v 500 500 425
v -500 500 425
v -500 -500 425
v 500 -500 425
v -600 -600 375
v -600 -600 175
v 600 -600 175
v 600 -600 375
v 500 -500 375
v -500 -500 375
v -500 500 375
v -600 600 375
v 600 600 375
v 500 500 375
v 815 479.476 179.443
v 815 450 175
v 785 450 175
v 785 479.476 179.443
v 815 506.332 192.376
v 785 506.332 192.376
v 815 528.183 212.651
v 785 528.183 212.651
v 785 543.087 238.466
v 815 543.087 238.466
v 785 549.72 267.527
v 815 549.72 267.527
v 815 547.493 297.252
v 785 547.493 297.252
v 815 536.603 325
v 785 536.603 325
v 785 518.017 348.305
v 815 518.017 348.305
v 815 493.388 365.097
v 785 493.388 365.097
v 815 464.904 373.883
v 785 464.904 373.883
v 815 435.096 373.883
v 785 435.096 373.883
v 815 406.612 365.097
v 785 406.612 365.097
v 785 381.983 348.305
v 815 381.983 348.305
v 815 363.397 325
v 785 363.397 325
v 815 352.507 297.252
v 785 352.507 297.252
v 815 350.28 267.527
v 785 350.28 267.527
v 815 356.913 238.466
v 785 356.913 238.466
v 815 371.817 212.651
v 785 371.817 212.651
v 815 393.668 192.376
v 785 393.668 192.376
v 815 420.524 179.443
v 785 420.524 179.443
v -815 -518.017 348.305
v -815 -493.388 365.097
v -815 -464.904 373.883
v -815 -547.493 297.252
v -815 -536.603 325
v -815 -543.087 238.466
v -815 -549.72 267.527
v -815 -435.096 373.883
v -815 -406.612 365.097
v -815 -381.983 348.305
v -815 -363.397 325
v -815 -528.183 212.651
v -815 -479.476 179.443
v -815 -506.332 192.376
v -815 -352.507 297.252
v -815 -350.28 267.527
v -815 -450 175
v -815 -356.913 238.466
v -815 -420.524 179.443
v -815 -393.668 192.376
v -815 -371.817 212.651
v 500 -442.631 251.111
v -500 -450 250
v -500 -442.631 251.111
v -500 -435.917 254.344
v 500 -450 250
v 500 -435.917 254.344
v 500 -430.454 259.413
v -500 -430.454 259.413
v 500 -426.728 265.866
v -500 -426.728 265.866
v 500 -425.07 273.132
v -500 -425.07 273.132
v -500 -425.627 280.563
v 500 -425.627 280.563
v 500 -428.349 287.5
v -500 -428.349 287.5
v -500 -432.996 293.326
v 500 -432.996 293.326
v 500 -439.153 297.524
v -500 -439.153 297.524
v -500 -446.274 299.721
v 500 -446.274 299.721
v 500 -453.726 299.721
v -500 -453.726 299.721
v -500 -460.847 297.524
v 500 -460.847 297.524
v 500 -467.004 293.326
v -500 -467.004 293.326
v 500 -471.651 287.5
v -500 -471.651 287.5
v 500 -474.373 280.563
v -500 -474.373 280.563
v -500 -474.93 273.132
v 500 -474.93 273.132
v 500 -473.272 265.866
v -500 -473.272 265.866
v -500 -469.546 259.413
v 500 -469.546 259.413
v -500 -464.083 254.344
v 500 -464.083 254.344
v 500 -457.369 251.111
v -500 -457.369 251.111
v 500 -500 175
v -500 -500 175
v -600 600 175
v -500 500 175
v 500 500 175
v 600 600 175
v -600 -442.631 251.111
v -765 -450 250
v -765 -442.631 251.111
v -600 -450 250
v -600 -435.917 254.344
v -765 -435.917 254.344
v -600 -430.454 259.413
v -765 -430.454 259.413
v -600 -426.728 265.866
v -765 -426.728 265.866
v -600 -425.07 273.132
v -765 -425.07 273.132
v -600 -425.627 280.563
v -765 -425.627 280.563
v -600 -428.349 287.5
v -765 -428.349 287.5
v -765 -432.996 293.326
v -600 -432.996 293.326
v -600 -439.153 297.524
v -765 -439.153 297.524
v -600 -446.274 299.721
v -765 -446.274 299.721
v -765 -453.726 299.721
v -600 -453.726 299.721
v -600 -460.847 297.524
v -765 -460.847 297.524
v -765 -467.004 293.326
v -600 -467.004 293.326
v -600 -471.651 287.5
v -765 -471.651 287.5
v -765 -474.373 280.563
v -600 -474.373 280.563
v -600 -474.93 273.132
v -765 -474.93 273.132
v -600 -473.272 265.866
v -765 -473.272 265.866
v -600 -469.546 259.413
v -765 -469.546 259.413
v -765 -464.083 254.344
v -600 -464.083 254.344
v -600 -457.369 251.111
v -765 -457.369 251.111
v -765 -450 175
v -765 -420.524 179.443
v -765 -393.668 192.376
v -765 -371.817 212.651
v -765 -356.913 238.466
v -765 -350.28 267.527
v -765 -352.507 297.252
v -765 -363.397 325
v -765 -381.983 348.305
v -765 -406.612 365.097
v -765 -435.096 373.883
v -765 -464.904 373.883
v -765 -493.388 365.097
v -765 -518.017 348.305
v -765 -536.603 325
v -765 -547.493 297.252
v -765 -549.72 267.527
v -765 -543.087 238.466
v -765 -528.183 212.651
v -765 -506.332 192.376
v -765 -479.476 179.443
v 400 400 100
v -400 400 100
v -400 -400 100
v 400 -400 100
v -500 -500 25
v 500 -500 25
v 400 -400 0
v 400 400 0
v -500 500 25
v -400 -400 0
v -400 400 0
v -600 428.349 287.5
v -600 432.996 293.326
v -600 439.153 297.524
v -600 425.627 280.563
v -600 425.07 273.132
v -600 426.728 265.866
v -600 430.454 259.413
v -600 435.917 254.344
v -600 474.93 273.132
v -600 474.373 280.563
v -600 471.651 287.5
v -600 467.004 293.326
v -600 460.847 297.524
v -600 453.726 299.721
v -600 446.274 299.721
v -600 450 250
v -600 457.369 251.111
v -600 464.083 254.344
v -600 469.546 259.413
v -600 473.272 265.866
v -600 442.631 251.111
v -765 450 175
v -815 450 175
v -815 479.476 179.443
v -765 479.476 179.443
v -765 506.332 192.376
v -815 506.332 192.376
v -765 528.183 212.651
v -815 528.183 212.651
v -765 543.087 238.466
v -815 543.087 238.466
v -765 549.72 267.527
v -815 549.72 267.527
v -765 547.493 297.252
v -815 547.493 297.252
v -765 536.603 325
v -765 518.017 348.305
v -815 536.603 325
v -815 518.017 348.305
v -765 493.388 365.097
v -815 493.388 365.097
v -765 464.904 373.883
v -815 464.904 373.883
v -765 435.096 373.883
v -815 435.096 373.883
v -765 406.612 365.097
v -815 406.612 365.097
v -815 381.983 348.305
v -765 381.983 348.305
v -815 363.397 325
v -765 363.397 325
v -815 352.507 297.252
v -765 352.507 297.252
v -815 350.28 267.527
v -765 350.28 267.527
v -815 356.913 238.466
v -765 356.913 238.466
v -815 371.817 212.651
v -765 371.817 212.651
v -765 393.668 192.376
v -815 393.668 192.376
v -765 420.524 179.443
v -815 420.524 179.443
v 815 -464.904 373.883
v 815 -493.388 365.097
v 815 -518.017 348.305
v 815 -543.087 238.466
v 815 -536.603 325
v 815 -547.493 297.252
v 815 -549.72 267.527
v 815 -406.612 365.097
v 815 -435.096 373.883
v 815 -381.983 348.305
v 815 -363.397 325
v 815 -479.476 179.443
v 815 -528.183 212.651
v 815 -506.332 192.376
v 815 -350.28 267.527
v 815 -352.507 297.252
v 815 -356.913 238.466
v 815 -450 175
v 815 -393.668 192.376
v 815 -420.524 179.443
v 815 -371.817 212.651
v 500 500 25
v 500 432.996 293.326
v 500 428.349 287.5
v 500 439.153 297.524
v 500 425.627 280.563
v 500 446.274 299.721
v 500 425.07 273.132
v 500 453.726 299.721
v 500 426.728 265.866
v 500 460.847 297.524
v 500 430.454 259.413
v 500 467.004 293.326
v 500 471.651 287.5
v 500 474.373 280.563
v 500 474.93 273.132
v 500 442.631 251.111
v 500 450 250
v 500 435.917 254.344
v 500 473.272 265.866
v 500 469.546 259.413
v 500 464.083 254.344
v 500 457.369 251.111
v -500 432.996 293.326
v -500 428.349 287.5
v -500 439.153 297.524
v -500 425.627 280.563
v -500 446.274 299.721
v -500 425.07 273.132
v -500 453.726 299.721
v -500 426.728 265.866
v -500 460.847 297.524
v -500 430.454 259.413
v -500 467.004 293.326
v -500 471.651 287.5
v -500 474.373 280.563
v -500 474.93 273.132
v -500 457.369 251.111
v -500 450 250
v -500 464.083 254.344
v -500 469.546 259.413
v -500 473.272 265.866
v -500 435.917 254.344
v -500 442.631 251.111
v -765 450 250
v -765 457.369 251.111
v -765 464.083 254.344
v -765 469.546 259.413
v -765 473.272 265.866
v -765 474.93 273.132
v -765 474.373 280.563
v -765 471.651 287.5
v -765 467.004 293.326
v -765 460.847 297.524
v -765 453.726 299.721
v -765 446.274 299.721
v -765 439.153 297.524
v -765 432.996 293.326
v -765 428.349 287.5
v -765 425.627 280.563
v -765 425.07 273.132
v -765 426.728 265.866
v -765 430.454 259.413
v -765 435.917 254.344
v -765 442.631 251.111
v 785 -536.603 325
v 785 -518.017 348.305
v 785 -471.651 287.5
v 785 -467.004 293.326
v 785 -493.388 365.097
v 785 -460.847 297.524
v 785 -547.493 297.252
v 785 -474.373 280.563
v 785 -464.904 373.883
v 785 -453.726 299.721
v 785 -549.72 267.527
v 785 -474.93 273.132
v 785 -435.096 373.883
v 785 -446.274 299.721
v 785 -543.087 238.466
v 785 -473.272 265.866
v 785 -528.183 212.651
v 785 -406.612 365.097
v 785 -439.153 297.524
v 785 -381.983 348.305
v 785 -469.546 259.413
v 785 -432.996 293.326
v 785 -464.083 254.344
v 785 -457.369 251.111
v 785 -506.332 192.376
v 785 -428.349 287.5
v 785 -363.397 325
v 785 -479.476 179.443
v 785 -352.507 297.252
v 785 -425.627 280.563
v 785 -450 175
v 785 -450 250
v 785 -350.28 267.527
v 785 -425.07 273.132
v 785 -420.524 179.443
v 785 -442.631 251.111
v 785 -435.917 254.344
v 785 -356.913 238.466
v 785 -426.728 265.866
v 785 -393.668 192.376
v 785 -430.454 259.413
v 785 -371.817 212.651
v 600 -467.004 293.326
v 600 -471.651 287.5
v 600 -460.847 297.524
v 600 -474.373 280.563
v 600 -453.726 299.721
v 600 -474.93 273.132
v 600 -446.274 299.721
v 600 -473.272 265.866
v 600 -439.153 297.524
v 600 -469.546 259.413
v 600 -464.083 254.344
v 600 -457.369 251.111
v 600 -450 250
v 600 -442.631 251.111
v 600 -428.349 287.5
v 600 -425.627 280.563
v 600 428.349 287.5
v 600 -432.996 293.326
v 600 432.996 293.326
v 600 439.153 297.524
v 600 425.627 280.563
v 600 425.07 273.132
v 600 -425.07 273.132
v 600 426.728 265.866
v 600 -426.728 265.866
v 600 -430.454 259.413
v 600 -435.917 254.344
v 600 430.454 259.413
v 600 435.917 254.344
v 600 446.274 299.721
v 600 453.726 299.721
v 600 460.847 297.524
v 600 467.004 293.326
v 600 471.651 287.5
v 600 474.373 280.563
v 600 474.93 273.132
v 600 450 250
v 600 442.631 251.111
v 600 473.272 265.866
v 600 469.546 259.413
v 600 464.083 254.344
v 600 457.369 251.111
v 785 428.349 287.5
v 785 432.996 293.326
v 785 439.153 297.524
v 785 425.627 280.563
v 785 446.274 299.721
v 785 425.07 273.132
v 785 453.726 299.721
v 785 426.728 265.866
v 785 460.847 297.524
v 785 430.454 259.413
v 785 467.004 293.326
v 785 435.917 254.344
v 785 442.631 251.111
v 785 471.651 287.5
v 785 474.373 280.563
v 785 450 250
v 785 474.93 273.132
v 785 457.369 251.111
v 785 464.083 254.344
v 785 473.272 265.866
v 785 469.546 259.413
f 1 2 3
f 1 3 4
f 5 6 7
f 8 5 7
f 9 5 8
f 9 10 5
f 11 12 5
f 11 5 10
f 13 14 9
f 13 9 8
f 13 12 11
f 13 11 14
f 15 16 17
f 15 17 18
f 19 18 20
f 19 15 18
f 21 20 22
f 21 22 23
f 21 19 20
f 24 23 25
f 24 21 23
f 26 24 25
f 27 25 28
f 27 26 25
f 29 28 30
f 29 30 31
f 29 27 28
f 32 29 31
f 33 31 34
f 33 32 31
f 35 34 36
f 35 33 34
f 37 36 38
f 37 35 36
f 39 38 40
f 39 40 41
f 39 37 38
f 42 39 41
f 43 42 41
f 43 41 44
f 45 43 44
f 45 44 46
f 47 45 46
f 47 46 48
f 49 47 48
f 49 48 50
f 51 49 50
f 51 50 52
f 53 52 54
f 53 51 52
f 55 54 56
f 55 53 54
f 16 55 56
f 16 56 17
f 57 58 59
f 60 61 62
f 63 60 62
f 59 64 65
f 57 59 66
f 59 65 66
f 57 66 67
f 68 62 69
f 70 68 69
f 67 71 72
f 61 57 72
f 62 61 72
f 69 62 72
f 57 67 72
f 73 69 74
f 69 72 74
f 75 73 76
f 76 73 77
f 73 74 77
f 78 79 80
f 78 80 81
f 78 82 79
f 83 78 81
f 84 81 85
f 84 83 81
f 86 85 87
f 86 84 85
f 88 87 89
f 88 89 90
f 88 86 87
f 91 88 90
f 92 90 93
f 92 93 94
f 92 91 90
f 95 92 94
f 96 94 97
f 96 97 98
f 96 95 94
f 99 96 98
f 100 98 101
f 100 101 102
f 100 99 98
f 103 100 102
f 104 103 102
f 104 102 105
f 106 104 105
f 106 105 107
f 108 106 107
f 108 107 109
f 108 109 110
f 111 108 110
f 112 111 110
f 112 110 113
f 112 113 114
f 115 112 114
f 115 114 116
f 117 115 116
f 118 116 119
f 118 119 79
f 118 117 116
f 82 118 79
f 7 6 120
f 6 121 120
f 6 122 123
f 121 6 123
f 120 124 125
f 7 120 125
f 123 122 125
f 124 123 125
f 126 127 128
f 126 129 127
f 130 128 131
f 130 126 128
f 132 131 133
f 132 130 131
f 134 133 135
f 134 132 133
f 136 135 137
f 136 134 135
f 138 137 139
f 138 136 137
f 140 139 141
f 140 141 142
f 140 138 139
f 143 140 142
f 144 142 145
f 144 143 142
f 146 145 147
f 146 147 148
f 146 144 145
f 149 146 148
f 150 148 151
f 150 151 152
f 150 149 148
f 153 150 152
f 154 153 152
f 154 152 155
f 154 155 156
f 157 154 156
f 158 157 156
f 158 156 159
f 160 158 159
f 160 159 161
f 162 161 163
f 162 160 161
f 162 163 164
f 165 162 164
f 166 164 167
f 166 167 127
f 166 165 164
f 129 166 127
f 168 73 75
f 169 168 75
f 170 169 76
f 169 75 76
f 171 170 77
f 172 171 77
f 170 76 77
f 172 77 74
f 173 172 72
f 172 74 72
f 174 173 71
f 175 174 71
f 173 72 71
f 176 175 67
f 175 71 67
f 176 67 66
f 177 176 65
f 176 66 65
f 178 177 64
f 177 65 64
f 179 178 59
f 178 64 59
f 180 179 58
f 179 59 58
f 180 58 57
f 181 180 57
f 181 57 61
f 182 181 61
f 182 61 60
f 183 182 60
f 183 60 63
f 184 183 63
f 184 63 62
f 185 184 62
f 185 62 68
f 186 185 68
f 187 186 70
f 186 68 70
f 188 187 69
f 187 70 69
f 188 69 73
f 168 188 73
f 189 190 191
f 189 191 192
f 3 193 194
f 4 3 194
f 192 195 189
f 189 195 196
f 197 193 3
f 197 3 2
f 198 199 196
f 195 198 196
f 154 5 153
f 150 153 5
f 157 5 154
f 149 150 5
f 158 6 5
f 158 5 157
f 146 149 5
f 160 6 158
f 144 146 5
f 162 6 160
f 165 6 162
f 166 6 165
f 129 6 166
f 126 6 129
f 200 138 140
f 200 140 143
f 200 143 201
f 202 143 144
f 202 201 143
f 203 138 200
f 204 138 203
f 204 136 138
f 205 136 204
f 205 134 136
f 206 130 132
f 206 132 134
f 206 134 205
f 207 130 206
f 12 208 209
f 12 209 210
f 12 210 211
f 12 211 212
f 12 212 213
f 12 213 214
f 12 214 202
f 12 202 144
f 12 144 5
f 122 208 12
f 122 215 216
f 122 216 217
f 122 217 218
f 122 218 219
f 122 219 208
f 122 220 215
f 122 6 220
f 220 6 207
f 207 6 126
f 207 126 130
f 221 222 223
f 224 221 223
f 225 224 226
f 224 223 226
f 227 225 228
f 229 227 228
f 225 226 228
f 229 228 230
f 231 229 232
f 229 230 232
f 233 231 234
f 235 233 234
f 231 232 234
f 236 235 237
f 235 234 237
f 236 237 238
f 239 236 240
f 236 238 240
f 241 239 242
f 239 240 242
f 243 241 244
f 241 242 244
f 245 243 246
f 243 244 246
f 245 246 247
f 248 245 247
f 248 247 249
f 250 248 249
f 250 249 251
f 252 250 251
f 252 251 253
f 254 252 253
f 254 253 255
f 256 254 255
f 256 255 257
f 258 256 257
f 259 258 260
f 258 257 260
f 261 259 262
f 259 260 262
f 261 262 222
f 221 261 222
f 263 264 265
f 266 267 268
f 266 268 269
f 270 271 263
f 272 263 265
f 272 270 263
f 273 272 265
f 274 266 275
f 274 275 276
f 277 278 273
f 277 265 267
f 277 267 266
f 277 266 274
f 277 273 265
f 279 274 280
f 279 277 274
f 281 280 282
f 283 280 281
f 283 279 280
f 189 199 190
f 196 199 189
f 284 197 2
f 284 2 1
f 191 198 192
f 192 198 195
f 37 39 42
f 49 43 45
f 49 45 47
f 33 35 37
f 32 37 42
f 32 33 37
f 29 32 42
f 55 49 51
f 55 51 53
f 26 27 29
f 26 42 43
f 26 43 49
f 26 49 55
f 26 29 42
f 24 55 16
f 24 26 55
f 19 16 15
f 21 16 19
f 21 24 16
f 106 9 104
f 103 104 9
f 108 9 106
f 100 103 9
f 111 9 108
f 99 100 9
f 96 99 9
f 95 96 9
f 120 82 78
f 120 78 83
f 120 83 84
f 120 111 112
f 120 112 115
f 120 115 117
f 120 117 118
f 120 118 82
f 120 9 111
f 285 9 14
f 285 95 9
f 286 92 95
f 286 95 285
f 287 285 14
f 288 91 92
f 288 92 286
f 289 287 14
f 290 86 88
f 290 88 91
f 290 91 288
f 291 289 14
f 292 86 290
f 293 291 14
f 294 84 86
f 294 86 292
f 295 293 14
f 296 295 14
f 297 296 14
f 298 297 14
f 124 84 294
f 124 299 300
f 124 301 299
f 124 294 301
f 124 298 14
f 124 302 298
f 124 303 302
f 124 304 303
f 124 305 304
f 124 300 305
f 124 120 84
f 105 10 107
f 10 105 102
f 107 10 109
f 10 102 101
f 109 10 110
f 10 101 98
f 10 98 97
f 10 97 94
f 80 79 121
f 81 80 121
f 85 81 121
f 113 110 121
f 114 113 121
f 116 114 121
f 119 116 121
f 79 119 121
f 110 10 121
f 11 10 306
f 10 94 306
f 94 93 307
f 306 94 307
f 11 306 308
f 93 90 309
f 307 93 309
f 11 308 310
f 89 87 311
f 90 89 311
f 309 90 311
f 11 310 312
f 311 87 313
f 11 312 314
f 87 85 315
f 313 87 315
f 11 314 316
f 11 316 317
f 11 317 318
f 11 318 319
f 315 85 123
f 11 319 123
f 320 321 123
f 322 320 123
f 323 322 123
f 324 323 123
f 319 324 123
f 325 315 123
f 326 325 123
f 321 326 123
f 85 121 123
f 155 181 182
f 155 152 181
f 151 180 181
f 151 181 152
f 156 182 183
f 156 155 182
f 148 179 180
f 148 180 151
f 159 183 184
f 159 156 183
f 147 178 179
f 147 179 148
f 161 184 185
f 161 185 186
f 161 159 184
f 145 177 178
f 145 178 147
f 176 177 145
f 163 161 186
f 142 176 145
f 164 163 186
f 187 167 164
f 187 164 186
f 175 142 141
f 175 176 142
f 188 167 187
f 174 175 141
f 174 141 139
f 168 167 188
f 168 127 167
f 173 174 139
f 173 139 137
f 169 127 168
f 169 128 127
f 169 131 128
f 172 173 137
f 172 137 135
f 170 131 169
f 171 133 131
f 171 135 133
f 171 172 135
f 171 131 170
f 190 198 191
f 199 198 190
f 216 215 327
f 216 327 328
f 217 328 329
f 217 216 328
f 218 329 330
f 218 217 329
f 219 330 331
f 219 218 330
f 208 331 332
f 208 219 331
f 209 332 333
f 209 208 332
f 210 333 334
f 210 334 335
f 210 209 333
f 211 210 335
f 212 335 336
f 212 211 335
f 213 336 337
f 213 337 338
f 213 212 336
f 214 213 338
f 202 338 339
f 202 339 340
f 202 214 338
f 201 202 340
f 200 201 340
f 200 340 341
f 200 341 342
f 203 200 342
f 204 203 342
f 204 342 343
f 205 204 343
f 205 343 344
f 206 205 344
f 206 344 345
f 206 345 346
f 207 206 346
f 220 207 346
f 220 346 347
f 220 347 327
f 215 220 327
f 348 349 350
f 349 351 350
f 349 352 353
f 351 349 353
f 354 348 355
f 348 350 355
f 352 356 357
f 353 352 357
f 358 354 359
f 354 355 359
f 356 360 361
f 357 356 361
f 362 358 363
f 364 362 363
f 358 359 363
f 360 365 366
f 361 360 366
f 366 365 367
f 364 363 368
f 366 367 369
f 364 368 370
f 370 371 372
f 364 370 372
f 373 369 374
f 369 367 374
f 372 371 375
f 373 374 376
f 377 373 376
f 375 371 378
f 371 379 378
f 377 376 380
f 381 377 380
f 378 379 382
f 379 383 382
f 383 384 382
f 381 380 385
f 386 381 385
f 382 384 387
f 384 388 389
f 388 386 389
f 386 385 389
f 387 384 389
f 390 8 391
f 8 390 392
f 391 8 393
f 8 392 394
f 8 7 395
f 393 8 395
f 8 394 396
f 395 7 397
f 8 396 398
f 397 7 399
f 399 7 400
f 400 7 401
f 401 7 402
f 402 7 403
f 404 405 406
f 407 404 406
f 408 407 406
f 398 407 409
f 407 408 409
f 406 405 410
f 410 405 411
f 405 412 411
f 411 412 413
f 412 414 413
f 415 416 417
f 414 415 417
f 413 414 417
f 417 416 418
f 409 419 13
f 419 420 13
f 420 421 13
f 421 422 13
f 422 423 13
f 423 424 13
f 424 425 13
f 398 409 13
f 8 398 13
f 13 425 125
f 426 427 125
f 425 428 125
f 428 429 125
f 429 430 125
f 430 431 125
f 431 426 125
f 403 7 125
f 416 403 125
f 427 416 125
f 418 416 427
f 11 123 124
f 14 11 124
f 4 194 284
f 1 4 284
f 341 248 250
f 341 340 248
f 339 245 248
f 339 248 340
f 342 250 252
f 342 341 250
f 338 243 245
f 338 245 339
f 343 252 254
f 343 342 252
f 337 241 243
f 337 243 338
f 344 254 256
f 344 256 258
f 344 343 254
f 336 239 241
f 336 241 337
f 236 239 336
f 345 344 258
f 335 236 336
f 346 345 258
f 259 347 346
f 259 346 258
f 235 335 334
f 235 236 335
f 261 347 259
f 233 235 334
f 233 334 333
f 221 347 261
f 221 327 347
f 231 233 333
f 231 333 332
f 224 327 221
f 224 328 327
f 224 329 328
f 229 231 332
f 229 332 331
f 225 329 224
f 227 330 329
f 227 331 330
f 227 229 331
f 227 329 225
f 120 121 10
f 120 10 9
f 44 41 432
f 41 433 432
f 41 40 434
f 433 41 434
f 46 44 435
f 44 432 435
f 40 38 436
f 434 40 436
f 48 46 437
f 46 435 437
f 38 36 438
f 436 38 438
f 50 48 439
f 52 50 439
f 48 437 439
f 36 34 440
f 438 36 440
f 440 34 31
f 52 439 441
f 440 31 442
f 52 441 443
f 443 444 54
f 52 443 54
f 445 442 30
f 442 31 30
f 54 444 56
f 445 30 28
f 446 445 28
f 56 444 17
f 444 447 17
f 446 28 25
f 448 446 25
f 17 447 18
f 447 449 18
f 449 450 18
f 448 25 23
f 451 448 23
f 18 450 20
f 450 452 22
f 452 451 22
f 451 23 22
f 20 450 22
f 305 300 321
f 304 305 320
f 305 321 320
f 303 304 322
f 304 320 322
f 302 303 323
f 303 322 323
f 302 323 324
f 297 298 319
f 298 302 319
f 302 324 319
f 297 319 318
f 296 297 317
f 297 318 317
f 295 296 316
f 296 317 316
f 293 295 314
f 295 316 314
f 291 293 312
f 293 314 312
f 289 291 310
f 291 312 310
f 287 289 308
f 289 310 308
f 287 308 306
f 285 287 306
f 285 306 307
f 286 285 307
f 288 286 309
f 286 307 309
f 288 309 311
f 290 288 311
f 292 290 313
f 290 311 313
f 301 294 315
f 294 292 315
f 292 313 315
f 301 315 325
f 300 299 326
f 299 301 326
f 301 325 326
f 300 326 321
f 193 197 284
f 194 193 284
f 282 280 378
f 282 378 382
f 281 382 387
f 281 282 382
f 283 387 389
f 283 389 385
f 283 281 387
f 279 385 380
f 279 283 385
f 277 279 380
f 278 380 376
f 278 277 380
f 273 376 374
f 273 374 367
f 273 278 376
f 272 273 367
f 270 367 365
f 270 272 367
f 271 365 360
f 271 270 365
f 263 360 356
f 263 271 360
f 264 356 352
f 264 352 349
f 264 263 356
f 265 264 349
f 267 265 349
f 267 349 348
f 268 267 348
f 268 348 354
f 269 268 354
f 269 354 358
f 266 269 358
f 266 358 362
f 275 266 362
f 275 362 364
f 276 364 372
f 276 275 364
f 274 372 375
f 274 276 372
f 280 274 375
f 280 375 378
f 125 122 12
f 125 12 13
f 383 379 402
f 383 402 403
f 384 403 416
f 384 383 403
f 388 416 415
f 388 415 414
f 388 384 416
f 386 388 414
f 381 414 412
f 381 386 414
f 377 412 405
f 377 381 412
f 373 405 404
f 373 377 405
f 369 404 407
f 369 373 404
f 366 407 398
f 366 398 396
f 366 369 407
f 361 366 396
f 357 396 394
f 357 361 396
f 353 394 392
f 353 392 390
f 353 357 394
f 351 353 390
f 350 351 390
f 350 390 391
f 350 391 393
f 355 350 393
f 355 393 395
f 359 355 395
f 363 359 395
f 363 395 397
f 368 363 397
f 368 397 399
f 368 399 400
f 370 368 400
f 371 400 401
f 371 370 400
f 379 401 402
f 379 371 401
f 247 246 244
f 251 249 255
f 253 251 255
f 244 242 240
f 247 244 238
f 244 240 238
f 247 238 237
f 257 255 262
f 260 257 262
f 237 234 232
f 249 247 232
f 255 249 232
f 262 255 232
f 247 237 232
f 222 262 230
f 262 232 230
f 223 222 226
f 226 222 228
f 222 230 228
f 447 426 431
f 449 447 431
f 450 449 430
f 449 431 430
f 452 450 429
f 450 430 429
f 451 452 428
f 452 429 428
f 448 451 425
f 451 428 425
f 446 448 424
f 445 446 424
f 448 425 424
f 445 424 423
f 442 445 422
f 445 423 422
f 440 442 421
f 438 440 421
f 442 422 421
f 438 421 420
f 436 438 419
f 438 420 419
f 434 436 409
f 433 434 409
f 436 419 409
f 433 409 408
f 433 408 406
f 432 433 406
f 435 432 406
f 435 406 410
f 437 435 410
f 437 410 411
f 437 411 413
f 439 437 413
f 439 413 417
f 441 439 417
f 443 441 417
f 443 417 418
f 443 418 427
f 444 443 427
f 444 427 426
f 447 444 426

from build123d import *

# Parameters (mm, degrees)
SKETCH_1_W      = 800
SKETCH_1_H      = 800
EXTRUDE_1_DEPTH = 100
EXTRUDE_START   = 25
SKETCH_2_W      = 1000
SKETCH_2_H      = 1000
EXTRUDE_2_DEPTH = 400
EXTRUDE_START_2 = 175
SKETCH_2_3_W    = 1200
SKETCH_2_3_H    = 1200
SKETCH_2_3_W_2  = 1000
SKETCH_2_3_H_2  = 1000
EXTRUDE_3_DEPTH = 200
SKETCH_4_R      = 25
EXTRUDE_4_DEPTH = 815
EXTRUDE_START_3 = 815
SKETCH_4_3_R    = 100
SKETCH_4_3_R_2  = 25
EXTRUDE_5_DEPTH = 30
EXTRUDE_START_4 = -815
SKETCH_4_4_R    = 100
SKETCH_4_4_R_2  = 25
EXTRUDE_6_DEPTH = 50


with BuildPart() as part:
    # Эскиз1 → Бобышка-Вытянуть1 (new body)
    with BuildSketch(Plane.XY):
        Rectangle(SKETCH_1_W, SKETCH_1_H)
    extrude(amount=EXTRUDE_1_DEPTH)


with BuildPart() as body_2:
    # Эскиз2 → Бобышка-Вытянуть2 (new body)
    with BuildSketch(Plane.XY.offset(EXTRUDE_START)):
        Rectangle(SKETCH_2_W, SKETCH_2_H)
    extrude(amount=EXTRUDE_2_DEPTH)


with BuildPart() as body_3:
    # Эскиз2<3> → Бобышка-Вытянуть3 (new body)
    with BuildSketch(Plane.XY.offset(EXTRUDE_START_2)):
        Rectangle(SKETCH_2_3_W, SKETCH_2_3_H)
        Rectangle(SKETCH_2_3_W_2, SKETCH_2_3_H_2, mode=Mode.SUBTRACT)
    extrude(amount=EXTRUDE_3_DEPTH)

    # Эскиз4 → Бобышка-Вытянуть4 (add, symmetric)
    with BuildSketch(Plane(origin=(0, 0, 0), x_dir=(0, 0, -1), z_dir=(1, 0, 0))):
        with Locations((-275, 450)):
            Circle(SKETCH_4_R)
        with Locations((-275, -450)):
            Circle(SKETCH_4_R)
    extrude(amount=EXTRUDE_4_DEPTH, both=True)

    # Эскиз4<3> → Бобышка-Вытянуть5 (add)
    with BuildSketch(Plane(origin=(0, 0, 0), x_dir=(0, 0, -1), z_dir=(1, 0, 0)).offset(EXTRUDE_START_3)):
        with Locations((-275, -450)):
            Circle(SKETCH_4_3_R)
        with Locations((-275, -450)):
            Circle(SKETCH_4_3_R_2, mode=Mode.SUBTRACT)
        with Locations((-275, 450)):
            Circle(SKETCH_4_3_R)
        with Locations((-275, 450)):
            Circle(SKETCH_4_3_R_2, mode=Mode.SUBTRACT)
    extrude(amount=-EXTRUDE_5_DEPTH)

    # Эскиз4<4> → Бобышка-Вытянуть6 (add)
    with BuildSketch(Plane(origin=(0, 0, 0), x_dir=(0, 0, -1), z_dir=(1, 0, 0)).offset(EXTRUDE_START_4)):
        with Locations((-275, -450)):
            Circle(SKETCH_4_4_R)
        with Locations((-275, -450)):
            Circle(SKETCH_4_4_R_2, mode=Mode.SUBTRACT)
        with Locations((-275, 450)):
            Circle(SKETCH_4_4_R)
        with Locations((-275, 450)):
            Circle(SKETCH_4_4_R_2, mode=Mode.SUBTRACT)
    extrude(amount=EXTRUDE_6_DEPTH)


solid = Compound([part.part, body_2.part, body_3.part])
